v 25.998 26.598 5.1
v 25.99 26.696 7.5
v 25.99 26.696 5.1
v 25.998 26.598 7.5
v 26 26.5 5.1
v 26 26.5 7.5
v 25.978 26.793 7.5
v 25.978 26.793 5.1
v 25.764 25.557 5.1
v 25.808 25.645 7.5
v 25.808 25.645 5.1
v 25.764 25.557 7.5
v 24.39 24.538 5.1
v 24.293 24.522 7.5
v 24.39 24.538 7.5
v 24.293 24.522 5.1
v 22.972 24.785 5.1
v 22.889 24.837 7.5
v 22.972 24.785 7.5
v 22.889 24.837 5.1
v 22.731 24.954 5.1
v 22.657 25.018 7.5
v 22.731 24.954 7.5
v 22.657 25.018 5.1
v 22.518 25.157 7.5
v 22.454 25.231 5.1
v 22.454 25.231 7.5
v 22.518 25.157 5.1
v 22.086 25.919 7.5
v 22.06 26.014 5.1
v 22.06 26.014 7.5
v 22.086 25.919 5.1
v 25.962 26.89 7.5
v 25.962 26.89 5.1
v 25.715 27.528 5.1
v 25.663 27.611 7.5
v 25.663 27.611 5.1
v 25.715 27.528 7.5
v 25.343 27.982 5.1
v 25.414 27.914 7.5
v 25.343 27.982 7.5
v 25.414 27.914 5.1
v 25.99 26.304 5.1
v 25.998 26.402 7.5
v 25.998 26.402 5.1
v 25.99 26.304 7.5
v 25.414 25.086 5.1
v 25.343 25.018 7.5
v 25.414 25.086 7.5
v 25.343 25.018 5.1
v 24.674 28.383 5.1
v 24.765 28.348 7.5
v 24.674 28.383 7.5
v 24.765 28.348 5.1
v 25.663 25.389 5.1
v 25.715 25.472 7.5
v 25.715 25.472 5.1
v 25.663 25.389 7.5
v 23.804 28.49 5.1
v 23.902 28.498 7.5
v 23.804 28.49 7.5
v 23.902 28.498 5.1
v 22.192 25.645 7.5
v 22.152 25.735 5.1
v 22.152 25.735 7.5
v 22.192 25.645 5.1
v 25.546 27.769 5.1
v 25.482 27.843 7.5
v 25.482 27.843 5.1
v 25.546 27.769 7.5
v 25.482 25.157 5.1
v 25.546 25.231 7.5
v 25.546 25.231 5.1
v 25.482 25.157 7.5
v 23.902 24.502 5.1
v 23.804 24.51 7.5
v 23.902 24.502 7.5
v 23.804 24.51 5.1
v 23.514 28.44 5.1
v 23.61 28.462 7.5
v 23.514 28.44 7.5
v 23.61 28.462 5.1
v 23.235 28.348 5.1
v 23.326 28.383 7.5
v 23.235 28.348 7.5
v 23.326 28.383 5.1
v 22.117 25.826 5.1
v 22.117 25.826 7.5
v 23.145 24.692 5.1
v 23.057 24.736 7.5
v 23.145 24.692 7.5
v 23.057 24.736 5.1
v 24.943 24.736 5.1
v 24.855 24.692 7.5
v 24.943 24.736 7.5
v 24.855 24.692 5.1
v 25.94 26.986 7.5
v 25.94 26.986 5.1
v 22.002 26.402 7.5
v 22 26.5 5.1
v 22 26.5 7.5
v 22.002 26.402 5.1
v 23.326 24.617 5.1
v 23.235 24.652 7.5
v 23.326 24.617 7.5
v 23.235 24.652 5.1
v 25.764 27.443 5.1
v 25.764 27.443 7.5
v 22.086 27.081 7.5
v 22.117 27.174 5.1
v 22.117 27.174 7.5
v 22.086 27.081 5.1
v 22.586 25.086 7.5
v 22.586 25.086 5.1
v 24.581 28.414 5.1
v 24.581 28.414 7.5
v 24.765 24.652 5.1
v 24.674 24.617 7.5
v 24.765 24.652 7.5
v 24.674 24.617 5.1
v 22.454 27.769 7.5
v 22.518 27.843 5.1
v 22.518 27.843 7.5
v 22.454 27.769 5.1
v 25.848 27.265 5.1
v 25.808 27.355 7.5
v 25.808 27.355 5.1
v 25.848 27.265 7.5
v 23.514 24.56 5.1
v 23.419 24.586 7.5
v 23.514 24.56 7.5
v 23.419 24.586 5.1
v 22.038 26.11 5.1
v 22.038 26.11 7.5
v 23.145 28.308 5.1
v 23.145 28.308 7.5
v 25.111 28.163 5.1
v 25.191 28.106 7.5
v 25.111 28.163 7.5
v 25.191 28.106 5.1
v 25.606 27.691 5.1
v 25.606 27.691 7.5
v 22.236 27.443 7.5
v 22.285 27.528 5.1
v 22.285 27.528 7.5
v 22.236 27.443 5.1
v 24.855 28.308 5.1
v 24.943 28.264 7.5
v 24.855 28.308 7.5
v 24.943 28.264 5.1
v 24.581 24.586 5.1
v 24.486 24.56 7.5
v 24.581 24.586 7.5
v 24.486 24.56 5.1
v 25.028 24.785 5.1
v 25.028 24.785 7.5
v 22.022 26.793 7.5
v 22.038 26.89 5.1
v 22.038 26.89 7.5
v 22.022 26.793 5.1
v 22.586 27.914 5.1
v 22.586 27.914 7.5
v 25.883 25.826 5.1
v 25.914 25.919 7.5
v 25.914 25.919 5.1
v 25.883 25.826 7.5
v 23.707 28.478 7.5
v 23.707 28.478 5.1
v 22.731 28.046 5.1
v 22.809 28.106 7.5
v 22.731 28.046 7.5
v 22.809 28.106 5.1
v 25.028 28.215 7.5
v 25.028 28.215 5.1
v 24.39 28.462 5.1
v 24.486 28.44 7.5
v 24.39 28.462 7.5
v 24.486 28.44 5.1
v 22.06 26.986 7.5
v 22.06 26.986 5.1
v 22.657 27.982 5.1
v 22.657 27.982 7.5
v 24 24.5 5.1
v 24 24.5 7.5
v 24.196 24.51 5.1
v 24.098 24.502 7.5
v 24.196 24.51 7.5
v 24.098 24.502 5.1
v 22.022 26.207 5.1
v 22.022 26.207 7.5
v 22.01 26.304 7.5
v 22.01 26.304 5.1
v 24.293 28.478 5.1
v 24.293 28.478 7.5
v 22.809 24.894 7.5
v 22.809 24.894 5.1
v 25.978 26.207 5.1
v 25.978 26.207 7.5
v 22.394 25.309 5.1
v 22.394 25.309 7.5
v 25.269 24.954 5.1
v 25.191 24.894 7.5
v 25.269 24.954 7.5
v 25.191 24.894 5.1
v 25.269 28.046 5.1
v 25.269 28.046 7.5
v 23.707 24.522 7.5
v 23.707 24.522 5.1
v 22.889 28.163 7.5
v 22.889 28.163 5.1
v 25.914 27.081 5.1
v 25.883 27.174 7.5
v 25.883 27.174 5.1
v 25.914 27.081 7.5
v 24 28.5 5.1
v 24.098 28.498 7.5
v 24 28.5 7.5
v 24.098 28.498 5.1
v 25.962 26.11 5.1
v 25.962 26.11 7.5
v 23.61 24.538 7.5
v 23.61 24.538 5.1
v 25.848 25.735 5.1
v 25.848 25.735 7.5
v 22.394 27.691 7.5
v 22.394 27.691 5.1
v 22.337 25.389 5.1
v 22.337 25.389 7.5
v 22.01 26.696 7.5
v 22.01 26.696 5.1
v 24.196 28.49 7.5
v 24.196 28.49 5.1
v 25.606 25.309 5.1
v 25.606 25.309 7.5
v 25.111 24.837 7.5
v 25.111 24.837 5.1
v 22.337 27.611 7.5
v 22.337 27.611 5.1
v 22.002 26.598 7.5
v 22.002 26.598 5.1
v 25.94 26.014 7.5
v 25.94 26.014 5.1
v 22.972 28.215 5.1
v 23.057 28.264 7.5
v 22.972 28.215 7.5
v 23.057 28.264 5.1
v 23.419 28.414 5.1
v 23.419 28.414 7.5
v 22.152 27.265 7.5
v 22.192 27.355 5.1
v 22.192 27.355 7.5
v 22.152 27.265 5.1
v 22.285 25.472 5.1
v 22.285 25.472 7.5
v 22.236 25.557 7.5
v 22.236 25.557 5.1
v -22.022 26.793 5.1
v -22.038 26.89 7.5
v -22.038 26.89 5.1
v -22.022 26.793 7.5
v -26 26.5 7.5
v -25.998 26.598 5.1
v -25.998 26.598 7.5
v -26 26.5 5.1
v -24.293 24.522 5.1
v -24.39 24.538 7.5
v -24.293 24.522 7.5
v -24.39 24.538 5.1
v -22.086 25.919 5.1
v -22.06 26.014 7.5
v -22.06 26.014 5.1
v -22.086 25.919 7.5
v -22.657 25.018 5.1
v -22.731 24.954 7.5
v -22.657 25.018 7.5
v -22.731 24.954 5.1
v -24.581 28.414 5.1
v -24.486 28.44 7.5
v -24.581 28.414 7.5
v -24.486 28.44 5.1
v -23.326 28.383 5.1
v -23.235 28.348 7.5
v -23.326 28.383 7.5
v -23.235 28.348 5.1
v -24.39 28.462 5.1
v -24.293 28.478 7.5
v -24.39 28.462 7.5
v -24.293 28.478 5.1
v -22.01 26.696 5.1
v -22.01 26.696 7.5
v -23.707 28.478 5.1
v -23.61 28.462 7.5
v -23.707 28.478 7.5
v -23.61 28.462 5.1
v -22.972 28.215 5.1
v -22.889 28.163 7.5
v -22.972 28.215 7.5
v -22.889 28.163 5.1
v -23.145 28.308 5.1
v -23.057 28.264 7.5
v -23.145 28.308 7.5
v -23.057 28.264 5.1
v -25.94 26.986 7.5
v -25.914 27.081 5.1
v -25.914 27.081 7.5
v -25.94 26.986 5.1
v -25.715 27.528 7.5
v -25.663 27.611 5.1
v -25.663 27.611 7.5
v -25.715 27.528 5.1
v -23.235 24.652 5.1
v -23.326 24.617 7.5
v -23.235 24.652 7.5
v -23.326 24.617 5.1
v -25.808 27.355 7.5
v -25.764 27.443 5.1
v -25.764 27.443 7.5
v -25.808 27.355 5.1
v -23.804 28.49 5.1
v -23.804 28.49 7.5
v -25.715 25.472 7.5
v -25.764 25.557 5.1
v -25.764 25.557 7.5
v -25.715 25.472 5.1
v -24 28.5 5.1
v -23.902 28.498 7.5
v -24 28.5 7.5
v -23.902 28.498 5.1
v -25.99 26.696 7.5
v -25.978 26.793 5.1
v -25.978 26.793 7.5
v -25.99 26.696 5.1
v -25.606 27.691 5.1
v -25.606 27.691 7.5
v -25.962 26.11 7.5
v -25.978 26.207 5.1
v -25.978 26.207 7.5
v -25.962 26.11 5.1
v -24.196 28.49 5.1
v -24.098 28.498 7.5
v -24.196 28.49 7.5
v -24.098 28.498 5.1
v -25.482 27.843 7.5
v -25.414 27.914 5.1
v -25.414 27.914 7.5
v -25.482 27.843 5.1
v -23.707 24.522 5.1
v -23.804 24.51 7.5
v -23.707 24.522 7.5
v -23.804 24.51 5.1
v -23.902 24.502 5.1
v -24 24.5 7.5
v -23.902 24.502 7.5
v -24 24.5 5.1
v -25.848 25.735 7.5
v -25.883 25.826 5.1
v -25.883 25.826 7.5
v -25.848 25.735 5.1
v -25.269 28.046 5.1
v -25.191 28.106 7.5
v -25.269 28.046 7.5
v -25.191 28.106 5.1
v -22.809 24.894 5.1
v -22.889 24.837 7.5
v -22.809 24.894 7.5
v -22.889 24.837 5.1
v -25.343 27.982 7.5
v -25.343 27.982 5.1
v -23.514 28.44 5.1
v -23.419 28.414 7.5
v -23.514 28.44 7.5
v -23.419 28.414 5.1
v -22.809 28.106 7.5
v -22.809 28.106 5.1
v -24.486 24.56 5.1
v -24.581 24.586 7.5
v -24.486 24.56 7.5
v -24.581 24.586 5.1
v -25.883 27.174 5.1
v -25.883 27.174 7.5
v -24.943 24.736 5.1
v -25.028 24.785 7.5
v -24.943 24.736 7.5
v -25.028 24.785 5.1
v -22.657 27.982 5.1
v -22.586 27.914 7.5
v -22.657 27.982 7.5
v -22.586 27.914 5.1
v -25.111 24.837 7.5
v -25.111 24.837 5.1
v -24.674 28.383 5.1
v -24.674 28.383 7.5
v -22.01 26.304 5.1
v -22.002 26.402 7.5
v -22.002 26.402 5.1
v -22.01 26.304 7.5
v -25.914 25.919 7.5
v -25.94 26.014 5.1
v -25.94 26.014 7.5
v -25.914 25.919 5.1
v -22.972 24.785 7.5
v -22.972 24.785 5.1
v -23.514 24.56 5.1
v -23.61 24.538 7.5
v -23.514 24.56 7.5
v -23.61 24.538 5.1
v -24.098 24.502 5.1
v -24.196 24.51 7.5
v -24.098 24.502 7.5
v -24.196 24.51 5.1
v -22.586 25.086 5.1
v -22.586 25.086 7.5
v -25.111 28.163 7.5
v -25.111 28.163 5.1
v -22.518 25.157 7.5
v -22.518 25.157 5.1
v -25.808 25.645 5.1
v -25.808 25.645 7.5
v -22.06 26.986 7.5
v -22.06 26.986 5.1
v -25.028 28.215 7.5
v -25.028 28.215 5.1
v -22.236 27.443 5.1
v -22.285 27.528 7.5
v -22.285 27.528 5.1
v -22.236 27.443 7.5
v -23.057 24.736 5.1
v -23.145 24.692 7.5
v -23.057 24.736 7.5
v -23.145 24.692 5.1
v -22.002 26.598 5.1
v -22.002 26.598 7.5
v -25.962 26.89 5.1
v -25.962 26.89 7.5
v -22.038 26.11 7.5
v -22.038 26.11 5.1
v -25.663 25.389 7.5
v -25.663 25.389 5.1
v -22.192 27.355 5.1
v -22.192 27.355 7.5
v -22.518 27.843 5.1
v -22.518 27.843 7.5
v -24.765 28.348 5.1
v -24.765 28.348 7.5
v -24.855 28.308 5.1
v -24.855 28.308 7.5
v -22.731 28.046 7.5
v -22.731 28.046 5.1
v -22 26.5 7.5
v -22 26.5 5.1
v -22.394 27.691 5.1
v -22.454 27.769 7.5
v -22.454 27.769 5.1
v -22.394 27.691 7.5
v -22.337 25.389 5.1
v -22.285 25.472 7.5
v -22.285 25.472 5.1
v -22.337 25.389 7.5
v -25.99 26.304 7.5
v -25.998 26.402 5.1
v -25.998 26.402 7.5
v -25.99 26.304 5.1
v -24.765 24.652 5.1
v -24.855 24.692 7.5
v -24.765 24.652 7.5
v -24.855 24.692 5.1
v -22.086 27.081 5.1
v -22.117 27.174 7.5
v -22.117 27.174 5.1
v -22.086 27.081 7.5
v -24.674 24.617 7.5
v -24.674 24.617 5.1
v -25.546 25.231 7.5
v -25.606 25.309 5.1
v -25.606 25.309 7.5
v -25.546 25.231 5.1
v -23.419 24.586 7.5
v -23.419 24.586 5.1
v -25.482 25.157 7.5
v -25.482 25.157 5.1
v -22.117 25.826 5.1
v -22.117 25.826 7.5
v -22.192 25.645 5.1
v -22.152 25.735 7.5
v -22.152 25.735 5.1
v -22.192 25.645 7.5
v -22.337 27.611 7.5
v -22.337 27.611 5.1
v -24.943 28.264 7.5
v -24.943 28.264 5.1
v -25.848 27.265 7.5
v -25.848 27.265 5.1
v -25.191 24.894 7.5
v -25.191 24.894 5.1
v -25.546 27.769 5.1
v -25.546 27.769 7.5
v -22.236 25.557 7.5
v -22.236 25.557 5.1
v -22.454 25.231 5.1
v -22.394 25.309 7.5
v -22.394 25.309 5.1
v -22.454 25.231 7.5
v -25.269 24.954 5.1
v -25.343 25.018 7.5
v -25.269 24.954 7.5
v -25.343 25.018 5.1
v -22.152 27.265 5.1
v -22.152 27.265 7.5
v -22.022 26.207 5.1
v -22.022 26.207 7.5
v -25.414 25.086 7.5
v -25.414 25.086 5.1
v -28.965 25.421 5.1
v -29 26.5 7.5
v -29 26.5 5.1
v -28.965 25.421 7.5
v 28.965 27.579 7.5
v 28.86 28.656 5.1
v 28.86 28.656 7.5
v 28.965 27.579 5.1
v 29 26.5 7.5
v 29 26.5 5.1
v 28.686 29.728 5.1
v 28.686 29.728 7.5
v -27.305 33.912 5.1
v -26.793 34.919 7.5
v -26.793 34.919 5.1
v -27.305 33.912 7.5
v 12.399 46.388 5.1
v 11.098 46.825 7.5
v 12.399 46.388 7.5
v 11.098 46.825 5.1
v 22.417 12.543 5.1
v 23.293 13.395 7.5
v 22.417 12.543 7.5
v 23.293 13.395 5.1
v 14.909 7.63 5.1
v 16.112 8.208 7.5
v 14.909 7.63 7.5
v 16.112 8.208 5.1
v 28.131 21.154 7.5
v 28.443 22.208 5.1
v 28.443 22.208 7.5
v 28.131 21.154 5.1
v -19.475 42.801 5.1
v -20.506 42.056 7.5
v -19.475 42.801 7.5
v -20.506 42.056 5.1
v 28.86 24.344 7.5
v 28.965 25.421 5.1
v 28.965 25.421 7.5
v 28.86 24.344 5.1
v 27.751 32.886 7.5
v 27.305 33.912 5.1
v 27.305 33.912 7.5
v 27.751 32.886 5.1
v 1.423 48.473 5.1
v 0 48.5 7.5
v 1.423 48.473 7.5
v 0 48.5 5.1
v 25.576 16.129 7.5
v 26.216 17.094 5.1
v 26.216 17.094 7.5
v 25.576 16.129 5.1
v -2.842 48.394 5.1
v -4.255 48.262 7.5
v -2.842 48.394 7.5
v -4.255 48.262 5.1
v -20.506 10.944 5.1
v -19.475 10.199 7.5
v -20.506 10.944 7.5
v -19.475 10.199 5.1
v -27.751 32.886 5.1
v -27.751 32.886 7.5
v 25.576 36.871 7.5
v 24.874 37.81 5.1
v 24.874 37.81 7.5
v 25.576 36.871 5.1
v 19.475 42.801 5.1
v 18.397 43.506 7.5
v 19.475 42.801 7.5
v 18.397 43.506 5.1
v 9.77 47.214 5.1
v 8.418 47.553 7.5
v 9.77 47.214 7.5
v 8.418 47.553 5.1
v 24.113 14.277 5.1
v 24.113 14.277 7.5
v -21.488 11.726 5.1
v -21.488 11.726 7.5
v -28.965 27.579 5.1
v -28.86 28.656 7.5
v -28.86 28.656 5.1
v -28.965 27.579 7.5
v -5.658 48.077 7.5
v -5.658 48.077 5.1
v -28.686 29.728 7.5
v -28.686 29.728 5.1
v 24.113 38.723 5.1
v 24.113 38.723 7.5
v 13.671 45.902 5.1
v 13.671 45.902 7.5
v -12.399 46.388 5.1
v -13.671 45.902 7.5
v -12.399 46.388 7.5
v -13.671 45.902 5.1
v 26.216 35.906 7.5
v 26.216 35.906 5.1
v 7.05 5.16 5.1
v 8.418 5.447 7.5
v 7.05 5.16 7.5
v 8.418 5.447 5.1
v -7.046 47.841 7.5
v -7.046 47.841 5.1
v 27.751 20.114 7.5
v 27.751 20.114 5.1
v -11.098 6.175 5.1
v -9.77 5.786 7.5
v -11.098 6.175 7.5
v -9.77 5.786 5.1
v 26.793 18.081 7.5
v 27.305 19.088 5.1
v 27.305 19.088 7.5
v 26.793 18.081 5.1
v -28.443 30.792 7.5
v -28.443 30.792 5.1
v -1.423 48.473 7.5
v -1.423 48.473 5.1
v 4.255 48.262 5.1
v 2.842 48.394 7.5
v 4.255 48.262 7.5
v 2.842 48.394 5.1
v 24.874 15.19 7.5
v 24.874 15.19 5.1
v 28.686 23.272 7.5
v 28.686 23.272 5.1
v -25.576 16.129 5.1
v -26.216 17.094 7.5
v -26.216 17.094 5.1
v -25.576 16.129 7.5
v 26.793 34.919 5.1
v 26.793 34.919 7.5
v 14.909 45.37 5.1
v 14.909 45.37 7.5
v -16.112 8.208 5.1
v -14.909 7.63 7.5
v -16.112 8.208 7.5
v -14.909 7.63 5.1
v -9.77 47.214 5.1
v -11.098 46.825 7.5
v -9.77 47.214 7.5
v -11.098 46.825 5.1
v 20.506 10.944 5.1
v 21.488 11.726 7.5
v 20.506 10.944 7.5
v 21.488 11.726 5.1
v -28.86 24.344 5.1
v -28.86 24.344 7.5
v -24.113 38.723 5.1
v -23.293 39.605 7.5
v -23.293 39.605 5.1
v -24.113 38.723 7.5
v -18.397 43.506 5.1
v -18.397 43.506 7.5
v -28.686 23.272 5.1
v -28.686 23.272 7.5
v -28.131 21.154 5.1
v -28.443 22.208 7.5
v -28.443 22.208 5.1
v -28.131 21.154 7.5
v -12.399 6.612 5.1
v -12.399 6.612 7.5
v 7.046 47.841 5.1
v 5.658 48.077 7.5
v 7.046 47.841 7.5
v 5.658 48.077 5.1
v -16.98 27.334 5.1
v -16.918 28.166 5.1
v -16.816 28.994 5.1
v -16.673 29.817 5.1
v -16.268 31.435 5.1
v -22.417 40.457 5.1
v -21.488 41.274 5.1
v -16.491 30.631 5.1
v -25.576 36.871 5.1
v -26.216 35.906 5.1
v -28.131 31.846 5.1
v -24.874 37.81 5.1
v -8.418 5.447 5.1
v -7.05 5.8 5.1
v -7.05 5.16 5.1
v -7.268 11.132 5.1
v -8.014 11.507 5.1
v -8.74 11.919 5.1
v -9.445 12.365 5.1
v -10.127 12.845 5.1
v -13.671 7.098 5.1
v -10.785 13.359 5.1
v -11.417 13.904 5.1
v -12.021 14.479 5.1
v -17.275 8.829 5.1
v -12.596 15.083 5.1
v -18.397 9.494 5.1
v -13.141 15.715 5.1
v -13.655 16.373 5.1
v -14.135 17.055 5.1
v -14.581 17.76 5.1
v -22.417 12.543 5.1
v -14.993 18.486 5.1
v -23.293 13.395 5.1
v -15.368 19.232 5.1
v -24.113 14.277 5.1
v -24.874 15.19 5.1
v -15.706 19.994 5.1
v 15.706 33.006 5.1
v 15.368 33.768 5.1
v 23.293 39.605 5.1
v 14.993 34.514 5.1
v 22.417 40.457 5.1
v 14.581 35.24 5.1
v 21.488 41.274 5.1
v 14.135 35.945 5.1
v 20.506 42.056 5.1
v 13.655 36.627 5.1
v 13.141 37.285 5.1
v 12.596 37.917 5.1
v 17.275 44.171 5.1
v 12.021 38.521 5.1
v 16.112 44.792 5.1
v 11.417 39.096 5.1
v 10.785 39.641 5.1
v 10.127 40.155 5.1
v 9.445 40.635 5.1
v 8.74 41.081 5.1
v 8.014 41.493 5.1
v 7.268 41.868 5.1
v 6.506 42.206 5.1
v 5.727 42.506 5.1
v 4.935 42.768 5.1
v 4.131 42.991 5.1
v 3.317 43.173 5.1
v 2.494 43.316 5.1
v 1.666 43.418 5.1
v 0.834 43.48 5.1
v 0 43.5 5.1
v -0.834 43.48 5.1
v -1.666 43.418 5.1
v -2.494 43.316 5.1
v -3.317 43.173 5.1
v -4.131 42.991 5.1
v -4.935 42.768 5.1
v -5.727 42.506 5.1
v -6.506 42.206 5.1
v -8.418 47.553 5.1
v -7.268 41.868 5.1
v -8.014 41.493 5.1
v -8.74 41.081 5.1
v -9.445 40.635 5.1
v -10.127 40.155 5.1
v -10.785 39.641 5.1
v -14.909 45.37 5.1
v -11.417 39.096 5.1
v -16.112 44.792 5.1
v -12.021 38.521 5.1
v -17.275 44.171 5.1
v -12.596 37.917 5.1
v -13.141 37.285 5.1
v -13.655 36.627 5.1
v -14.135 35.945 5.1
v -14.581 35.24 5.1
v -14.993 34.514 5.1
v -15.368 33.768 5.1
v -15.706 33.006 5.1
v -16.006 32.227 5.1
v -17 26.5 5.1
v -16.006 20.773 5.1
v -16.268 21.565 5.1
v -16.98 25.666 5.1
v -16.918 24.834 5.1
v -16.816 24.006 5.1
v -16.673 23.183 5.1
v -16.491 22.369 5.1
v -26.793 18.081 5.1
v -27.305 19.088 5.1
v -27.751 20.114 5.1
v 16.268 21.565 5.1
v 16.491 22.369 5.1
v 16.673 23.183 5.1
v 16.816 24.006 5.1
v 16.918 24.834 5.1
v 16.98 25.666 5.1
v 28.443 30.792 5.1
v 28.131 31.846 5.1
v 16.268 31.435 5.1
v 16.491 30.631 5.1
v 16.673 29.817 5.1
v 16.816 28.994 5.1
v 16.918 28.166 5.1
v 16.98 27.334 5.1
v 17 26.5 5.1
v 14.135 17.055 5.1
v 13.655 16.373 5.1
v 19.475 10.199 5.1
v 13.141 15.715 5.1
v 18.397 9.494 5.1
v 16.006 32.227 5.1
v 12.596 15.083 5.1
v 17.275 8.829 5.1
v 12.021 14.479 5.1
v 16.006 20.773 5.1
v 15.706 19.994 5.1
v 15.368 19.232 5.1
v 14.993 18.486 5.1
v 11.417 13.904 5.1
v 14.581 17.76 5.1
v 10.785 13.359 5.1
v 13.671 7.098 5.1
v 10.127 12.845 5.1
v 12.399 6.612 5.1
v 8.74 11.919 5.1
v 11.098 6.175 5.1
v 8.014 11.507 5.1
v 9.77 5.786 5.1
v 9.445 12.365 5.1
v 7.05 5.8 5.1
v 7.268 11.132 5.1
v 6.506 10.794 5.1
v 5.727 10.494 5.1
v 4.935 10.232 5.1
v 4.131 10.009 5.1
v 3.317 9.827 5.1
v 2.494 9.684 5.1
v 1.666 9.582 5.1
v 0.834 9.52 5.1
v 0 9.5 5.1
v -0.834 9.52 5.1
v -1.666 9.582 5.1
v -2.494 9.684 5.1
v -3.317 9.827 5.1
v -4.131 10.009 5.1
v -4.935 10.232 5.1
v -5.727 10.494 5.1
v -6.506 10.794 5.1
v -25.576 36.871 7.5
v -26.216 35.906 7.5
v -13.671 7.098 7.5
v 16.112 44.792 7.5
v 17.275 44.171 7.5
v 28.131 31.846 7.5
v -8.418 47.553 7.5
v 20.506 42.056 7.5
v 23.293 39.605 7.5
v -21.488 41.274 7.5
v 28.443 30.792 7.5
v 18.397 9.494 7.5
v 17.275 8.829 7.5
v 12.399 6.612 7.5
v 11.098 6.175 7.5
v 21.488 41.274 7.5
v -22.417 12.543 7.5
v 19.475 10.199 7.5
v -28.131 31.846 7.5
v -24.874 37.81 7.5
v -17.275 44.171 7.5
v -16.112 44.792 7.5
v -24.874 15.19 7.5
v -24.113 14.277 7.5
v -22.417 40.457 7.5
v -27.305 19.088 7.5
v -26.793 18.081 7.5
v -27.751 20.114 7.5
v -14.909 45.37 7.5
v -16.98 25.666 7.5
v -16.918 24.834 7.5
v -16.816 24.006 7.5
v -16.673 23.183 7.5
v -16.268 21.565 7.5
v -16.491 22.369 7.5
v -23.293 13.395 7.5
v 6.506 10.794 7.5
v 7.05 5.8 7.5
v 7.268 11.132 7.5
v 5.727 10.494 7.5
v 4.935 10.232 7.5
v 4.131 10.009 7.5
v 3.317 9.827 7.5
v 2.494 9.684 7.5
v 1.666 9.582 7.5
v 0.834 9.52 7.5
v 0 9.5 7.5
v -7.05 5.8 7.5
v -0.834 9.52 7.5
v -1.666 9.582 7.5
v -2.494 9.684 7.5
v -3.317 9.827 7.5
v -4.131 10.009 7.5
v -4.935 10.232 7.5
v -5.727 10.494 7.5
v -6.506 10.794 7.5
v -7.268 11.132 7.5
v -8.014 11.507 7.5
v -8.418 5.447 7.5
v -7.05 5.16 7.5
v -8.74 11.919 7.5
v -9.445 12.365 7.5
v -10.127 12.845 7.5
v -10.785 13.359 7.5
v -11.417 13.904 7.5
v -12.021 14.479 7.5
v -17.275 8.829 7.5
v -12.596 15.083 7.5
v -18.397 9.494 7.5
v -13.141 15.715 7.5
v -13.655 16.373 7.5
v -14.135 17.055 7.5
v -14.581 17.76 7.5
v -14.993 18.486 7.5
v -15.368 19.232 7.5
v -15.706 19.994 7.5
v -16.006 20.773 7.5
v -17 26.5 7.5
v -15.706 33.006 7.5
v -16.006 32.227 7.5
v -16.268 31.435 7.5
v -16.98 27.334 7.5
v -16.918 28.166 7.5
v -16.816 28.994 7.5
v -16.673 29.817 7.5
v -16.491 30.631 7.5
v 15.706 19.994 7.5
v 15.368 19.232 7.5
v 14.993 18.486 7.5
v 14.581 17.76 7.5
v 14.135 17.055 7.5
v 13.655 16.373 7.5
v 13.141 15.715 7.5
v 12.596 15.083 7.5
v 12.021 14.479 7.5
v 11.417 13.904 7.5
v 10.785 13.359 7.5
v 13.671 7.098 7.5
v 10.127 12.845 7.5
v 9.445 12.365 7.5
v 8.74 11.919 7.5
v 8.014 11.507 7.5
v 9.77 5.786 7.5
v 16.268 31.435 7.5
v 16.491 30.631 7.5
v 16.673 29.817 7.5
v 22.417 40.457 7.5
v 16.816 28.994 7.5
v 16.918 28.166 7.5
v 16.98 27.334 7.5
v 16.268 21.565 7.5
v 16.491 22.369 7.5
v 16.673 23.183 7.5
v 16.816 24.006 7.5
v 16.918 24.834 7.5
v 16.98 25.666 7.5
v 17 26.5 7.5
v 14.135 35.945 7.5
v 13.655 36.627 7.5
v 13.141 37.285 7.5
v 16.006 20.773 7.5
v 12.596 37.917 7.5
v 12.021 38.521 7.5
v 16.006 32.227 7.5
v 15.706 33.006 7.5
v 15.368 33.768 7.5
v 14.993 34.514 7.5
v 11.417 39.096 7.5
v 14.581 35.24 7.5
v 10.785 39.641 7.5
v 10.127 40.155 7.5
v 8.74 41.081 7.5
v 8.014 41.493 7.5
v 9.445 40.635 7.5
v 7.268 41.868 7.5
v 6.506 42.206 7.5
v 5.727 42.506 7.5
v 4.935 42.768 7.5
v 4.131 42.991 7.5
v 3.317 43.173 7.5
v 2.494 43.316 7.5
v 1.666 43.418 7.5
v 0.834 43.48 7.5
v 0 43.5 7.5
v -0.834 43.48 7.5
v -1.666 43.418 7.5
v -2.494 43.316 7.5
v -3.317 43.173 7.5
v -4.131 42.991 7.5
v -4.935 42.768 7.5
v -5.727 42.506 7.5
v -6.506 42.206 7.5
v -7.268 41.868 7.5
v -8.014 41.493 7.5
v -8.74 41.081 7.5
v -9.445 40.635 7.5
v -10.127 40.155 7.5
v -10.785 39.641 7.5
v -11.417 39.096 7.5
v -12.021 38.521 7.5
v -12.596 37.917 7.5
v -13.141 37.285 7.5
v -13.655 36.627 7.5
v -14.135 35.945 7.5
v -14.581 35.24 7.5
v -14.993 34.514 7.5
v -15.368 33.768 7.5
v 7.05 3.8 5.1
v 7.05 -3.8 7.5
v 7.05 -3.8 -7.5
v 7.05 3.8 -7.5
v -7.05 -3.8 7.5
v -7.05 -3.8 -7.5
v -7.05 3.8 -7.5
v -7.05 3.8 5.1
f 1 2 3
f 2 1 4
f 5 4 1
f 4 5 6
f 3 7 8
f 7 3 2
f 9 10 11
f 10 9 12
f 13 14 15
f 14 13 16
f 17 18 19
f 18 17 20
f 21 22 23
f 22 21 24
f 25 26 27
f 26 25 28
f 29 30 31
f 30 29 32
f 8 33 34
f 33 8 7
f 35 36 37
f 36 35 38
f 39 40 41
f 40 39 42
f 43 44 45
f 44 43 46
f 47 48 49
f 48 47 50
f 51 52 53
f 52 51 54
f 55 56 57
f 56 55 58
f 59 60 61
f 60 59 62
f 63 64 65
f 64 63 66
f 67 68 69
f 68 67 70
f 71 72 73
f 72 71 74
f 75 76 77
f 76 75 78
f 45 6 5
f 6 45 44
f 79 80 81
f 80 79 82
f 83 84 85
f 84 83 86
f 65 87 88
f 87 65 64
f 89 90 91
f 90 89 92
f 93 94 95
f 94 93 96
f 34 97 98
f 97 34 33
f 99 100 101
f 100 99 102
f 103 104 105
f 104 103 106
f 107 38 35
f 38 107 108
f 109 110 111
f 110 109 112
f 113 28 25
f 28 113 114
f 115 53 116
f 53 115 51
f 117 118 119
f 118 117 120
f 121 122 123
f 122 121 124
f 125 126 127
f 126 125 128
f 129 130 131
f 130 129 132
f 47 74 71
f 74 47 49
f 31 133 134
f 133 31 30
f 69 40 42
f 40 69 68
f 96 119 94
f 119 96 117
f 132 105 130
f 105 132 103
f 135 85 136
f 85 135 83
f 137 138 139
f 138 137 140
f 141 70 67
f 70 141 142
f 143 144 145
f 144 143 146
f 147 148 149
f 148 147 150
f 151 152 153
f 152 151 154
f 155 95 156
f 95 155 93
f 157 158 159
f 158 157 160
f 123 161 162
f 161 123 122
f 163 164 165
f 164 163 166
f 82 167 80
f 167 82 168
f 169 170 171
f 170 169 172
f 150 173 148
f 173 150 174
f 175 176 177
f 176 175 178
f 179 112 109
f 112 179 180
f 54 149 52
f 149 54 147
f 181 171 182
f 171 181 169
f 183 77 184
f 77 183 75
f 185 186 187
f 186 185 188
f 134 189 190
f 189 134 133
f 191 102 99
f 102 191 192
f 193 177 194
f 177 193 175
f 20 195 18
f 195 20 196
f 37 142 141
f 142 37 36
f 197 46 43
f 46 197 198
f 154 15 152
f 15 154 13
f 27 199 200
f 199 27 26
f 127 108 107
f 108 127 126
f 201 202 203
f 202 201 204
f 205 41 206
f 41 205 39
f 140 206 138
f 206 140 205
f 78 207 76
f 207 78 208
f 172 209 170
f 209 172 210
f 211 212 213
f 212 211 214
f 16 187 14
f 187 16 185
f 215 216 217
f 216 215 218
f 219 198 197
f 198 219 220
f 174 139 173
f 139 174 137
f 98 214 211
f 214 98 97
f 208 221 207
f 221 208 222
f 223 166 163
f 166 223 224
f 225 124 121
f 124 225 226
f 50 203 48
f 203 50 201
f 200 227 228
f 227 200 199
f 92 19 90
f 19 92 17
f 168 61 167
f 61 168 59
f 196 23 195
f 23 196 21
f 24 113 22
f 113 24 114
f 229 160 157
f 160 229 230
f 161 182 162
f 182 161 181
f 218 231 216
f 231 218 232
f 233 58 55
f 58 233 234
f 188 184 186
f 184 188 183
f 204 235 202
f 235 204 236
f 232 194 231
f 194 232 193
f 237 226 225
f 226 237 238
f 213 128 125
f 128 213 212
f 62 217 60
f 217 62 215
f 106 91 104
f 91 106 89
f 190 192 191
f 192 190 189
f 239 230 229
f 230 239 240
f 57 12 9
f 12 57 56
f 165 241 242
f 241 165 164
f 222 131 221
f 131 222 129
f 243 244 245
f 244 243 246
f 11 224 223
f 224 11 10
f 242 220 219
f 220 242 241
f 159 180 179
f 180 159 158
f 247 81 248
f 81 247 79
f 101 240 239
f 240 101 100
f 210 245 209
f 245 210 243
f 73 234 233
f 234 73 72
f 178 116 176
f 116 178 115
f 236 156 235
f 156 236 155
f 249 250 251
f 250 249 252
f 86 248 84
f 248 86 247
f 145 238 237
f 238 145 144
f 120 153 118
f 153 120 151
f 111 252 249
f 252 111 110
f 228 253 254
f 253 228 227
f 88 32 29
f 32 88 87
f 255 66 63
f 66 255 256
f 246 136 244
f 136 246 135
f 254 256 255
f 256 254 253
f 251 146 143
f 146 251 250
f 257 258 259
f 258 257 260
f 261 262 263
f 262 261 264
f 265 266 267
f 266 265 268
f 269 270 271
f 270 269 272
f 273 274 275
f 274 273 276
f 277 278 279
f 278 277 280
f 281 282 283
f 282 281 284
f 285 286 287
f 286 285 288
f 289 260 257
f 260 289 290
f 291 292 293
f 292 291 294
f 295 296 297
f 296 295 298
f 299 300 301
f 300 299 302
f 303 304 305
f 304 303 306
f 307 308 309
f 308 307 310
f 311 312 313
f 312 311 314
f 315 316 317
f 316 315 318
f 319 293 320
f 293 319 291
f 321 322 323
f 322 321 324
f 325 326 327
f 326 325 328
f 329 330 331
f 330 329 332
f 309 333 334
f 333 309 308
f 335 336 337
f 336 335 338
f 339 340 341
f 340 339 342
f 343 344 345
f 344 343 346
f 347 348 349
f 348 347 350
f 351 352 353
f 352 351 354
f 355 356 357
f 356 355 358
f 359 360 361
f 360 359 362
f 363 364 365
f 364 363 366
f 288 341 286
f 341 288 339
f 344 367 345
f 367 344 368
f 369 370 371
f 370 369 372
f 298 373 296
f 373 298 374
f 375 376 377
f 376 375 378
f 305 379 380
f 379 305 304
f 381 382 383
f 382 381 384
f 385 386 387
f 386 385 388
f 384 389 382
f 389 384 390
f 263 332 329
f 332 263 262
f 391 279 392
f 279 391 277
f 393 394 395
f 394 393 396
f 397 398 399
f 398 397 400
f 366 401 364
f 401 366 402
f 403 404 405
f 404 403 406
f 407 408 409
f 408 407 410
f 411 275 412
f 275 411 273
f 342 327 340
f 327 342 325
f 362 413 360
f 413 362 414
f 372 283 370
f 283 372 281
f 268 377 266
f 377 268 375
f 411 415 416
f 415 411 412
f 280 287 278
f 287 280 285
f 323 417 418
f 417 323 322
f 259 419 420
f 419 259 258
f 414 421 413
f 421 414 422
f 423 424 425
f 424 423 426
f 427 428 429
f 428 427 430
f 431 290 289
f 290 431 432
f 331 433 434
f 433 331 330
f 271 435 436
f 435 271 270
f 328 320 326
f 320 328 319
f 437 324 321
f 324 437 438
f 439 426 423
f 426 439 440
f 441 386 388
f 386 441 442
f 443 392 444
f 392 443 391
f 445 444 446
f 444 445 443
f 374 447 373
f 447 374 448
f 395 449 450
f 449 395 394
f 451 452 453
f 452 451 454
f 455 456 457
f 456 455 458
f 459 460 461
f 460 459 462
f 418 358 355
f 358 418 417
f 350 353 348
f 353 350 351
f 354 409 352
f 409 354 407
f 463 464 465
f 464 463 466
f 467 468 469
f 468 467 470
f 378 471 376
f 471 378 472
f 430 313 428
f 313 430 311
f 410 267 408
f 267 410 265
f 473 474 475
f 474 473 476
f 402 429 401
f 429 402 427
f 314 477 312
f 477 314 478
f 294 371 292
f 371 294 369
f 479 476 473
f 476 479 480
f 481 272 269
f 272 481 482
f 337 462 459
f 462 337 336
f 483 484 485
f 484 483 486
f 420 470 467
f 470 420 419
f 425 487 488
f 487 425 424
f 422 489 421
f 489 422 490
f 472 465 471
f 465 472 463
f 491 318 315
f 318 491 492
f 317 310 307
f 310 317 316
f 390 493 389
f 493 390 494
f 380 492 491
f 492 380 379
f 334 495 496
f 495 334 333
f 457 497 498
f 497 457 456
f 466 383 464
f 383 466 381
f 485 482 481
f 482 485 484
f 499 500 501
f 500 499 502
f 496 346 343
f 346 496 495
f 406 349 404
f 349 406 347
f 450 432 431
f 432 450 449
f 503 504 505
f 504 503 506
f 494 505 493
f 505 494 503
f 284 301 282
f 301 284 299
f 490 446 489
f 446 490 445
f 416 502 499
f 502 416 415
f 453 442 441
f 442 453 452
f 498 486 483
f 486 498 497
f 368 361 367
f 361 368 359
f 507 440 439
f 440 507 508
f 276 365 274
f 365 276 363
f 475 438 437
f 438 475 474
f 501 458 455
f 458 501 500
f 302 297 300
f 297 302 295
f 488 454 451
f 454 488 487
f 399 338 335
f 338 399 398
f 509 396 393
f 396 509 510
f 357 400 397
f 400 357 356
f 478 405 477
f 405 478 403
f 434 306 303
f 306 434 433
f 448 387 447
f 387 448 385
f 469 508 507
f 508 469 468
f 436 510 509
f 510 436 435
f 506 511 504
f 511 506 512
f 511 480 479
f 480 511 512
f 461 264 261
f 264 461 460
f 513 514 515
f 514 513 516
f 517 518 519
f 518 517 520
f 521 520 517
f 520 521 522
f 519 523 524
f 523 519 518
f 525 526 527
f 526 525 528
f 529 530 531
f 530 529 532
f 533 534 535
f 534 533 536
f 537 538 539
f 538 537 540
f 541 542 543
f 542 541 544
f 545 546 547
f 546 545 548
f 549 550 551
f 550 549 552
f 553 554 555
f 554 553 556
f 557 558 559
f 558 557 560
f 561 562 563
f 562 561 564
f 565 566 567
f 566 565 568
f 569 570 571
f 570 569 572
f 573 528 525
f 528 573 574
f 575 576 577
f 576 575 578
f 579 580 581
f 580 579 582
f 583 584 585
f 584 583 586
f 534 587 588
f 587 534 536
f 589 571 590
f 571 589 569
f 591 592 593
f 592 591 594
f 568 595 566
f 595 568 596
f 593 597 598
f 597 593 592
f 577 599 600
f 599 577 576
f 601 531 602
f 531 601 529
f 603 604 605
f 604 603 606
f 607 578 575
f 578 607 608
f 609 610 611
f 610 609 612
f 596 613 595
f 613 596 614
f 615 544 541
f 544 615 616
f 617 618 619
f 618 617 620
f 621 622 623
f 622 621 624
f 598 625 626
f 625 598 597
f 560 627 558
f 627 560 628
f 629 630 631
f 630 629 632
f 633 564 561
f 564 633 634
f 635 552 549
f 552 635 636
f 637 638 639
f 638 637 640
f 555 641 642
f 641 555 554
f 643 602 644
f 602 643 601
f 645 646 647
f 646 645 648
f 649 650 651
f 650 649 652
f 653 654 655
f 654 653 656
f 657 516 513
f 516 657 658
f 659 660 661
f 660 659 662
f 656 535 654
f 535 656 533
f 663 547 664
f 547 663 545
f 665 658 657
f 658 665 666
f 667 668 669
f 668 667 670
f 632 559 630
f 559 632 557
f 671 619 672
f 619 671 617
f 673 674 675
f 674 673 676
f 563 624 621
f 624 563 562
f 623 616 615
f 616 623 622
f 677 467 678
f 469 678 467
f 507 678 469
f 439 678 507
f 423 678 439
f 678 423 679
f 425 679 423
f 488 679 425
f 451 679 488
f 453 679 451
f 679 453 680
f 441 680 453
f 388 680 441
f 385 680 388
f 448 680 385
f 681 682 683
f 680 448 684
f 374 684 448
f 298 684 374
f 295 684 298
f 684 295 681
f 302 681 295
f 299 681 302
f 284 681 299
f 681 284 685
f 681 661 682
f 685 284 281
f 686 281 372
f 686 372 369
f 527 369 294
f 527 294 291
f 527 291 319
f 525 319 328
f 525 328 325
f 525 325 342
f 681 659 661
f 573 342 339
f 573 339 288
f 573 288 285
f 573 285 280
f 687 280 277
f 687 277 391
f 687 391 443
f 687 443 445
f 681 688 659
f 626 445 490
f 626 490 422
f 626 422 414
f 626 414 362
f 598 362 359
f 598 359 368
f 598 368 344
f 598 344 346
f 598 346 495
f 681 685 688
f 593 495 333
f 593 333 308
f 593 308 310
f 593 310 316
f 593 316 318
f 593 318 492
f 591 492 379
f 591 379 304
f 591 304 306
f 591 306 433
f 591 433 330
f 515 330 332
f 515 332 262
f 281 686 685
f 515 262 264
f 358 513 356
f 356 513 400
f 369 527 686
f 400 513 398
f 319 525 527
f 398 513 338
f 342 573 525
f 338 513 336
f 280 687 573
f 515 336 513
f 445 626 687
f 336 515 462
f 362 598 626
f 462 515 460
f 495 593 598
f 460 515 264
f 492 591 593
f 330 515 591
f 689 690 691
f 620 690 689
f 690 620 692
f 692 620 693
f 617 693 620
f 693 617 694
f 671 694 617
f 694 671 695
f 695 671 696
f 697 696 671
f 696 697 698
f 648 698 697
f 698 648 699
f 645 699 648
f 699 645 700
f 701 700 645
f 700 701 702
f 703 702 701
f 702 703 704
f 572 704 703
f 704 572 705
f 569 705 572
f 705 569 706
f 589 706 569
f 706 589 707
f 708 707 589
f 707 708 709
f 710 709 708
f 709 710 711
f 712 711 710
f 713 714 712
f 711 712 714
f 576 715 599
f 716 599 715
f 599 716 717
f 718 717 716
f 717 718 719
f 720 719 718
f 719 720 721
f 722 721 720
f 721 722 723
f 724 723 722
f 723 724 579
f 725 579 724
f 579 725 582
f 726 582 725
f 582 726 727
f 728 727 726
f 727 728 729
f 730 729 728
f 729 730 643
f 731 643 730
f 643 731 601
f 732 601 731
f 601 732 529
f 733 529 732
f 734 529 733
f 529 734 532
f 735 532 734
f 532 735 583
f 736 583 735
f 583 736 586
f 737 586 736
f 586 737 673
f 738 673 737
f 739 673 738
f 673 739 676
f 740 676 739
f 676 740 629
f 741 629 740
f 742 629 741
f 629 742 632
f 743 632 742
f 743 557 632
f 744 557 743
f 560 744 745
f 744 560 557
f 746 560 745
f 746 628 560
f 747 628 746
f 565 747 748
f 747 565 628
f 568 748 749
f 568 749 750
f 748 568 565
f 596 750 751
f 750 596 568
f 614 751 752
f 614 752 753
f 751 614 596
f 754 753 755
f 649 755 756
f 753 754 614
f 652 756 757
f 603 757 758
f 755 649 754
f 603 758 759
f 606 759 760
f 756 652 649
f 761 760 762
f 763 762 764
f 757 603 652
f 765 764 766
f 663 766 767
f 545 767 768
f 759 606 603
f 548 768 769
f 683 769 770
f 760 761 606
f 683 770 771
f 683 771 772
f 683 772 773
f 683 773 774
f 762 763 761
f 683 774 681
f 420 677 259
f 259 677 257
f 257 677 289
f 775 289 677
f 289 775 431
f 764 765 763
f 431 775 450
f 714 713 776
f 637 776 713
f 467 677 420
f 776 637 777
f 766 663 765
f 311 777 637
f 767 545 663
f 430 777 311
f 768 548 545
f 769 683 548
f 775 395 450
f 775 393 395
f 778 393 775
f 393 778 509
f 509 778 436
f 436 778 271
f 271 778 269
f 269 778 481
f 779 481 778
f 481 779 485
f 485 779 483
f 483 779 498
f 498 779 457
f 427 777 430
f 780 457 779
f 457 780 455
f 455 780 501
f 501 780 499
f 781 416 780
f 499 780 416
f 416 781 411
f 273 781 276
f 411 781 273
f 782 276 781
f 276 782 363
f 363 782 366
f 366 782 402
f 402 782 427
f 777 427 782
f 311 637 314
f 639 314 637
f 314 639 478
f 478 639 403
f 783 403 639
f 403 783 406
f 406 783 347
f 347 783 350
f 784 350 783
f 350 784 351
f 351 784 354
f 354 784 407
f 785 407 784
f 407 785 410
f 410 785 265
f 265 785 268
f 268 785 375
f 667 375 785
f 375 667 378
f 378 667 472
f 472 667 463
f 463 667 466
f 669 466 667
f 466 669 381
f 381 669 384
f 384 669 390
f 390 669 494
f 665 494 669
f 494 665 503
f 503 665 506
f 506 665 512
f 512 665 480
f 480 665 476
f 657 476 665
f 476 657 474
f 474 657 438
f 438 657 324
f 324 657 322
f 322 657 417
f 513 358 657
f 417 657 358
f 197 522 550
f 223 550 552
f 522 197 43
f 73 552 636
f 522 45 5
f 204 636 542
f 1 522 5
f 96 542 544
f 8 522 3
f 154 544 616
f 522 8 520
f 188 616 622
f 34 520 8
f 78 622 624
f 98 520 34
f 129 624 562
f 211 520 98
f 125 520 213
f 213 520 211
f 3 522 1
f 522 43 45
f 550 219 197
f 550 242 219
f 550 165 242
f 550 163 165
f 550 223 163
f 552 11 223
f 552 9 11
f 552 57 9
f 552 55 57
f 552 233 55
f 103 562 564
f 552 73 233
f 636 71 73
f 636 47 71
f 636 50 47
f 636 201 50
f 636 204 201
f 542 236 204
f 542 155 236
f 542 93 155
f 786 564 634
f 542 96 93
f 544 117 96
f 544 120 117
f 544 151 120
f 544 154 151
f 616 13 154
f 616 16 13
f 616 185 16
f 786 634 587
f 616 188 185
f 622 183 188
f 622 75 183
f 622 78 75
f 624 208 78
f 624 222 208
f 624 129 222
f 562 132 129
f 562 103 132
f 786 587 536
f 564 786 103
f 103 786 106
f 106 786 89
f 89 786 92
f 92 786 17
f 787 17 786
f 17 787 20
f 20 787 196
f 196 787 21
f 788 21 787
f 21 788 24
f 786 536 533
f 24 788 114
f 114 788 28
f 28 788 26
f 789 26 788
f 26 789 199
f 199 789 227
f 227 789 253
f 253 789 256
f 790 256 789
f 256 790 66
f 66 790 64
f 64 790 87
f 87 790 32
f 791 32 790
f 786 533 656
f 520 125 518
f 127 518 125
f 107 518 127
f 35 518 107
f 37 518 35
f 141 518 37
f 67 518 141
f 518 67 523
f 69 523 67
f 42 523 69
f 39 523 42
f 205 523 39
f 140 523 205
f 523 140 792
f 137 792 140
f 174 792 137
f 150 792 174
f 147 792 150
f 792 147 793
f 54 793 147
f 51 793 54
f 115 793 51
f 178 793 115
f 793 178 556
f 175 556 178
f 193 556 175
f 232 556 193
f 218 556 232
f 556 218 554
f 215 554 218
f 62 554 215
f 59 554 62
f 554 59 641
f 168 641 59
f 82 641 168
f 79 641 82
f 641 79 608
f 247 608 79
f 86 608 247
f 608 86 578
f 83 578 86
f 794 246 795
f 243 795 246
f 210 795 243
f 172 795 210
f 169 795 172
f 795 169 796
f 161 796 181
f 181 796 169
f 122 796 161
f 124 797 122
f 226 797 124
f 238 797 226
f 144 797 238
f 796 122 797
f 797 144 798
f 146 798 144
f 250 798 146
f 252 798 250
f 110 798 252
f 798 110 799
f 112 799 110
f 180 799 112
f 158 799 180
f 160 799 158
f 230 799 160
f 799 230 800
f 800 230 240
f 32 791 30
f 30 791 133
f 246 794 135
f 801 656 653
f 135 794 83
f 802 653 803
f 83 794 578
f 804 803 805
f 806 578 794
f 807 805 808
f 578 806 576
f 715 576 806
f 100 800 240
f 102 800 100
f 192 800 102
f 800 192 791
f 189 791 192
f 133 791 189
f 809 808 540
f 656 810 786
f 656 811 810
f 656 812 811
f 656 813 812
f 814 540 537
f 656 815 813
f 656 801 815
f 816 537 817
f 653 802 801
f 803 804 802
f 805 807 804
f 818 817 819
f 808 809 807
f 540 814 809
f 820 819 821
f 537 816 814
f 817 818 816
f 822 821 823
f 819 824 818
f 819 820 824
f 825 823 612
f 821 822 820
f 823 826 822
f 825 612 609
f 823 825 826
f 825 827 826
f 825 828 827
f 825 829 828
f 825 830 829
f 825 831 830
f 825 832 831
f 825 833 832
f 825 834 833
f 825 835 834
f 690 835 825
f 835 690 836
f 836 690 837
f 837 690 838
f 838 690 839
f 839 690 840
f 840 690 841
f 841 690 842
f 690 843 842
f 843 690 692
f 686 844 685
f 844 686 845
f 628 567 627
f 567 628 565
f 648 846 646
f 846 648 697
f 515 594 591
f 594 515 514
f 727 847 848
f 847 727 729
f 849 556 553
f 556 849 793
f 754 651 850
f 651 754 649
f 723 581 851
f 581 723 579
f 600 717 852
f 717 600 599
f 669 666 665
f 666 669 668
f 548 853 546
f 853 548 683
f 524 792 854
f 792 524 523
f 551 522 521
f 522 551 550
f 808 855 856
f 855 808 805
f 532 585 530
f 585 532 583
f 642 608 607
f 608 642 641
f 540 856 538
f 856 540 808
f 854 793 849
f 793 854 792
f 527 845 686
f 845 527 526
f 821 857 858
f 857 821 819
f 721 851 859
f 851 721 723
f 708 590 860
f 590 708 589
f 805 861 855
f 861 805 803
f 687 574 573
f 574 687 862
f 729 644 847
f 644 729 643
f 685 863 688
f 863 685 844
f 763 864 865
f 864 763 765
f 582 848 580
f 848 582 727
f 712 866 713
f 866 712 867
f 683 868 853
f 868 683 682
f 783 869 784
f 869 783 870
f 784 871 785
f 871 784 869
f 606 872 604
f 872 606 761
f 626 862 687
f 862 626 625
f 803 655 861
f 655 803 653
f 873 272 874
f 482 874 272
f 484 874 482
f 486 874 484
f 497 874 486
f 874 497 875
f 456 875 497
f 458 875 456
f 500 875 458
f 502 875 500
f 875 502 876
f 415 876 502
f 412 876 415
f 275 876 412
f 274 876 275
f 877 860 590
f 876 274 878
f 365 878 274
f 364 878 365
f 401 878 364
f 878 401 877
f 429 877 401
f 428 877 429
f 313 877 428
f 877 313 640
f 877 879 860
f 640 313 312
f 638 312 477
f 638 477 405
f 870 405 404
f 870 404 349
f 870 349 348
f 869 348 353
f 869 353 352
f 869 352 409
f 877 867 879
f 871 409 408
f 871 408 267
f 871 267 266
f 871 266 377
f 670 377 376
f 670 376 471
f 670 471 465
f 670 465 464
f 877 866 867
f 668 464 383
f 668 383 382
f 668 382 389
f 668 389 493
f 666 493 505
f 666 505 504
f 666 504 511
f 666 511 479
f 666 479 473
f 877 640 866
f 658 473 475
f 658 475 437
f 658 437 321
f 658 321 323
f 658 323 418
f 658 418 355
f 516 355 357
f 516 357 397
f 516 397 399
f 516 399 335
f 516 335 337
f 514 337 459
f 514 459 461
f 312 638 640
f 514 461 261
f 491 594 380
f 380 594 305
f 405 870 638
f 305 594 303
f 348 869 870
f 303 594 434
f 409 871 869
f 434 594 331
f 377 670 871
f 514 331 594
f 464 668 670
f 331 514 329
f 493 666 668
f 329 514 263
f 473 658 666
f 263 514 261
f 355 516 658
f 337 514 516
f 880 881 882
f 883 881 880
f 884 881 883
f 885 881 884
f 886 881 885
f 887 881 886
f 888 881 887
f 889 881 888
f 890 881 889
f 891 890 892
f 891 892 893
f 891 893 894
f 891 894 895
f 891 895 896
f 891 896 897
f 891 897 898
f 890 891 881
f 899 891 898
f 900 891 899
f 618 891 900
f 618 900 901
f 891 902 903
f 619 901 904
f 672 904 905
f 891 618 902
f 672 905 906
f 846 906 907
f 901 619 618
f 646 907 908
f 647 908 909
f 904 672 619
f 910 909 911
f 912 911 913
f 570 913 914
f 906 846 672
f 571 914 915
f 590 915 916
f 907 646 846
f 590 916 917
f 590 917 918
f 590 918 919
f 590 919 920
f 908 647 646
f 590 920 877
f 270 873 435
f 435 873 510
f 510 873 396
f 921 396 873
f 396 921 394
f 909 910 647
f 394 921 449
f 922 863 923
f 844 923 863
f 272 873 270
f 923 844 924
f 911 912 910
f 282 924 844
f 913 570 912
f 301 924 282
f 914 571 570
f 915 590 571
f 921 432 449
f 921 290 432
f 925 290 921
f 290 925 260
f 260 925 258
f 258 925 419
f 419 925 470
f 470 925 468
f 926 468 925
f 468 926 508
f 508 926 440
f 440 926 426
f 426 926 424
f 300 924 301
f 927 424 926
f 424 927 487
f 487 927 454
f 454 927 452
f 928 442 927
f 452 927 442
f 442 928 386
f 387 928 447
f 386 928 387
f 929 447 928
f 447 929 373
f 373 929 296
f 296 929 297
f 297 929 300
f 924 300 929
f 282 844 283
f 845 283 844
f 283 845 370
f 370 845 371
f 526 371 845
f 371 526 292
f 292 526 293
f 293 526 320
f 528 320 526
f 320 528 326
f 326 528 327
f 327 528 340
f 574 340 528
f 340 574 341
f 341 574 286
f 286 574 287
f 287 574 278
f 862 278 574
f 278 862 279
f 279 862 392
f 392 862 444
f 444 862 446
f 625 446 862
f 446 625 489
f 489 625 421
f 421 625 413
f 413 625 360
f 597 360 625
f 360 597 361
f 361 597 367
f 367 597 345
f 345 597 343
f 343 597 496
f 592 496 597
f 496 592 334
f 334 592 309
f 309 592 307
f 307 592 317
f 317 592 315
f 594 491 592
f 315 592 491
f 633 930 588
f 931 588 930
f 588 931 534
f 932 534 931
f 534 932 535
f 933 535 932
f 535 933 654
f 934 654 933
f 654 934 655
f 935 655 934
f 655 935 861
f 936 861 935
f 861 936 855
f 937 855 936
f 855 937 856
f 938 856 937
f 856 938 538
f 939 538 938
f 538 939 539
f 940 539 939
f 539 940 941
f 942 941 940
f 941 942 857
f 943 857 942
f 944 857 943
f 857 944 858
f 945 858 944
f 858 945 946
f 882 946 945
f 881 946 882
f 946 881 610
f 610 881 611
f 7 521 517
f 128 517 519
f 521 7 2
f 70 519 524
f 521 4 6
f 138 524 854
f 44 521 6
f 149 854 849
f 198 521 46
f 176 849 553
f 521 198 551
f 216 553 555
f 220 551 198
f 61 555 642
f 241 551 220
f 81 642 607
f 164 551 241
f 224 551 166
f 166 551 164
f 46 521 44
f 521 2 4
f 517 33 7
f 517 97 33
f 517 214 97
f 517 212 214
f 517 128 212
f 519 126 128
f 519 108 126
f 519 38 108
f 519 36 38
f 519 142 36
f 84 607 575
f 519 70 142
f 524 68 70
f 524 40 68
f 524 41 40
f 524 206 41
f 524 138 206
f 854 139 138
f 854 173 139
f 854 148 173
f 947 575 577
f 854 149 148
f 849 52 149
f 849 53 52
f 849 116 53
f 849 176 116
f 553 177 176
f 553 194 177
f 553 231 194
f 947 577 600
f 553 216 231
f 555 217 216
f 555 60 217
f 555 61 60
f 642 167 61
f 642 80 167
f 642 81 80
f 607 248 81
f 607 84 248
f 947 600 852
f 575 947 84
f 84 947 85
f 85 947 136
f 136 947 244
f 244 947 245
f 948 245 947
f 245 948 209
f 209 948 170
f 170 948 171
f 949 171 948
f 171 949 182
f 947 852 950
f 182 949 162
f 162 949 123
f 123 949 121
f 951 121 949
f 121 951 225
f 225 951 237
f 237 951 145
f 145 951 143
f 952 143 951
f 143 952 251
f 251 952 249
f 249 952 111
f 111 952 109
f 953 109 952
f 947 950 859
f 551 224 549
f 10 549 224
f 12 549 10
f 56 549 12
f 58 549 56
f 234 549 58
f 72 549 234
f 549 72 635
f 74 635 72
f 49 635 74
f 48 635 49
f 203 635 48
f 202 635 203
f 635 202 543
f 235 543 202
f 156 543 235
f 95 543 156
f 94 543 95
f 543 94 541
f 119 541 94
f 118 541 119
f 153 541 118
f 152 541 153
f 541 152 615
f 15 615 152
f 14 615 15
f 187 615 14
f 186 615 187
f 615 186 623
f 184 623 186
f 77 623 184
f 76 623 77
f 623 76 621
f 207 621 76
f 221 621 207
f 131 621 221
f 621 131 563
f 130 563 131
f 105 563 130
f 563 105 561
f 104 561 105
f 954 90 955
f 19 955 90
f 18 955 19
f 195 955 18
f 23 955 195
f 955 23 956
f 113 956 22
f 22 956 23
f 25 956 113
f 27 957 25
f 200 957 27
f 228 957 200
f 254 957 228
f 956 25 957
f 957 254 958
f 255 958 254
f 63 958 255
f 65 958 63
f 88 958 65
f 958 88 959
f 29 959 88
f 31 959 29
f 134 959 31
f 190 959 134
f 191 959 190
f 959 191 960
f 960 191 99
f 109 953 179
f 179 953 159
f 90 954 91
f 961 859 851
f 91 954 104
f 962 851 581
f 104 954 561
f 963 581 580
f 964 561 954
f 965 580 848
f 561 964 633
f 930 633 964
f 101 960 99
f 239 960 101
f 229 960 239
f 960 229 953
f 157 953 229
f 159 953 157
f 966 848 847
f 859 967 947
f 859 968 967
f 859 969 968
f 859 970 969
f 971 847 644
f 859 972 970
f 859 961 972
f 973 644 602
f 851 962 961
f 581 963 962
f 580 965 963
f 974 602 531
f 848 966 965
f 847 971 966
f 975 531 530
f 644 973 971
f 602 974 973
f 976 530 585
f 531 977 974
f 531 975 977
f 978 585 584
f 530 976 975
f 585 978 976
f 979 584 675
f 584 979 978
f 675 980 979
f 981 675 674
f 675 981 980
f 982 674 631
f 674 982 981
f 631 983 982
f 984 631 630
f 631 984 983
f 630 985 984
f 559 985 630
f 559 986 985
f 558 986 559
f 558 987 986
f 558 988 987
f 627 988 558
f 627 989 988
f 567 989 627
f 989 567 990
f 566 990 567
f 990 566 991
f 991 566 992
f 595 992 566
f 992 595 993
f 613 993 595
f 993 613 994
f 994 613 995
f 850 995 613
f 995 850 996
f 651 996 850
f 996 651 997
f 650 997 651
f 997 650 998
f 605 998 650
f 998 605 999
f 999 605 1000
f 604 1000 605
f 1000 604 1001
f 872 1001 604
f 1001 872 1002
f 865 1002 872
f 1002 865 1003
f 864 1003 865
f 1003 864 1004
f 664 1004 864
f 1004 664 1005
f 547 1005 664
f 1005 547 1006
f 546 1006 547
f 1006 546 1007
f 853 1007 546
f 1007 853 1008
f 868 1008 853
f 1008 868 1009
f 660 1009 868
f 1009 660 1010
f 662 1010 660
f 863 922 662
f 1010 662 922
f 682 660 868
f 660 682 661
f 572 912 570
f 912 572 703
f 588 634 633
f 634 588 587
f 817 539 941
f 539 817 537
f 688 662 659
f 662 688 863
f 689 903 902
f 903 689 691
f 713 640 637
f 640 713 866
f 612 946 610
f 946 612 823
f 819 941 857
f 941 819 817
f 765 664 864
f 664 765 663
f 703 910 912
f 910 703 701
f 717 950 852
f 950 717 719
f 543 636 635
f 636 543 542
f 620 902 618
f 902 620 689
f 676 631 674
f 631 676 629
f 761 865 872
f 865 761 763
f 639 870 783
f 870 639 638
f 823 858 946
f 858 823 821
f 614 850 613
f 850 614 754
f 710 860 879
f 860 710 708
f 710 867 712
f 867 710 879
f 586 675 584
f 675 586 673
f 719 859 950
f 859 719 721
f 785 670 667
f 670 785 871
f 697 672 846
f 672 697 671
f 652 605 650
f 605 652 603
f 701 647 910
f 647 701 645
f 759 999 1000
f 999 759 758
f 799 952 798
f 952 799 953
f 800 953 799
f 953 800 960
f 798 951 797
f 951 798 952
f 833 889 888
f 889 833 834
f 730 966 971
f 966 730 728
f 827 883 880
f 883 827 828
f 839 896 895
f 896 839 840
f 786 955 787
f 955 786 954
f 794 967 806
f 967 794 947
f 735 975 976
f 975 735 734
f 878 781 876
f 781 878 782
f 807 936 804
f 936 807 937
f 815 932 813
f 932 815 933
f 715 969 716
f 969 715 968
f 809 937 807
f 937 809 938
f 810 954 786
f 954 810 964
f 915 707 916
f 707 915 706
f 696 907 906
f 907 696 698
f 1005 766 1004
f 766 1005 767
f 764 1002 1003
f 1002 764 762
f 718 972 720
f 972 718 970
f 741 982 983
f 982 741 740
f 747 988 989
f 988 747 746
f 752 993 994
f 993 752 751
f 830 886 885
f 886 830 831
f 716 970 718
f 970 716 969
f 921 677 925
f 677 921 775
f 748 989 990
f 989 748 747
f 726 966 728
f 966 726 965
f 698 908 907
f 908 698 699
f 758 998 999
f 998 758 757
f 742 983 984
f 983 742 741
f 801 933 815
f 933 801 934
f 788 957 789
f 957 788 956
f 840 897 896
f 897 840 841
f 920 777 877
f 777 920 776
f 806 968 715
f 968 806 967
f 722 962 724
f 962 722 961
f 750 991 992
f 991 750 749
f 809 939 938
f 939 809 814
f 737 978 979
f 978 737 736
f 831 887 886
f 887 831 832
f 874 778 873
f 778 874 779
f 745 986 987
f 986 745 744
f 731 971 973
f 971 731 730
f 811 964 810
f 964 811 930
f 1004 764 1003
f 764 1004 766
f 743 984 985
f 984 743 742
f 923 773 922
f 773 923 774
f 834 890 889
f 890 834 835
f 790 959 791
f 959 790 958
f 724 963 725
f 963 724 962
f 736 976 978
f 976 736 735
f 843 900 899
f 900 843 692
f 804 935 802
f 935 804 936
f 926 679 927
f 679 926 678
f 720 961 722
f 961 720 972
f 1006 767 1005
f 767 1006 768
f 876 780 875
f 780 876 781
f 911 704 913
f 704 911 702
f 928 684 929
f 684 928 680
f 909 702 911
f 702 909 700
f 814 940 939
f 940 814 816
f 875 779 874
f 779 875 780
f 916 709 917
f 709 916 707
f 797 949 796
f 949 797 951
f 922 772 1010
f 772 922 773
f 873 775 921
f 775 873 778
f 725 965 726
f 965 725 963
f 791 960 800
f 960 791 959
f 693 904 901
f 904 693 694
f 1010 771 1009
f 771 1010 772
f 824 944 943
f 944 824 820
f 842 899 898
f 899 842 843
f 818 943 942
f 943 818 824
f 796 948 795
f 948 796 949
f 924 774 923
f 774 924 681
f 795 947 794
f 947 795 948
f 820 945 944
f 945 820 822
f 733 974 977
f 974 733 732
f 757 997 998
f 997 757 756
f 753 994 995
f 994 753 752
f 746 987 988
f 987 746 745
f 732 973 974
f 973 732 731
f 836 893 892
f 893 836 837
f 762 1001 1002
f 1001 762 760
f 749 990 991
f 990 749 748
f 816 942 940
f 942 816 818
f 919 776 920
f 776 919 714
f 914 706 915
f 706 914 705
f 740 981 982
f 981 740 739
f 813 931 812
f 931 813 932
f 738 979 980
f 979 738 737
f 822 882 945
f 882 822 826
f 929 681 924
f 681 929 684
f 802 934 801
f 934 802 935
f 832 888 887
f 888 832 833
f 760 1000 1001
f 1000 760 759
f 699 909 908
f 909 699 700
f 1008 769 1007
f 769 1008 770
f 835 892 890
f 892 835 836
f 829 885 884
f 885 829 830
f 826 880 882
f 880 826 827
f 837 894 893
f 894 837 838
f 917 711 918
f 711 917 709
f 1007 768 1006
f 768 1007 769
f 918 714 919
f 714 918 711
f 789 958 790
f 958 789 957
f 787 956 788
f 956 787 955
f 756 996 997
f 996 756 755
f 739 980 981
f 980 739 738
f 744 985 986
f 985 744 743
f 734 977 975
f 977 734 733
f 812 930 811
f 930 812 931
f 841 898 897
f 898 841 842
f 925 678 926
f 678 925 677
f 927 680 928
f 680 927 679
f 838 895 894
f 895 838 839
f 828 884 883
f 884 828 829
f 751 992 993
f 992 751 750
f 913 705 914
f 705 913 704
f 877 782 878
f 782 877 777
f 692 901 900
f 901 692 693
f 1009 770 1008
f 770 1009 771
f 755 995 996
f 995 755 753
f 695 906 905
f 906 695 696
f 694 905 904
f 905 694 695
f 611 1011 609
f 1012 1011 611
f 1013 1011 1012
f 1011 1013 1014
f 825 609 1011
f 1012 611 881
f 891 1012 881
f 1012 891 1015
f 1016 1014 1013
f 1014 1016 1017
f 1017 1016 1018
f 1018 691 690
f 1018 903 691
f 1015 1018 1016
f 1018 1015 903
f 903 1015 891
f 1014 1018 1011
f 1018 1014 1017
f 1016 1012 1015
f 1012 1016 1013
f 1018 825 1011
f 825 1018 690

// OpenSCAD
zFite = $preview ? 0.1 : 0; // z-fighting avoidance for preview
$fn = $preview ? 64 : 128;

// diameter of the motor
motor_diameter = 34;

// motor mount side insert
flange_width = 5;
flange_height = 2.4;
flange_screw_distance = 48.0;

flange_insert_separation = 2;

insert_height = 15;
insert_width = 14.1;
insert_depth = 7.6;

screw_diameter = 4;

peri_pump_side_mount(flange_width = flange_width, flange_height = flange_height, flange_screw_distance = flange_screw_distance, flange_insert_separation = flange_insert_separation, insert_height = insert_height, insert_width = insert_width, insert_depth = insert_depth, motor_diameter = motor_diameter, screw_diameter = screw_diameter);

module peri_pump_side_mount(flange_width, flange_height, flange_screw_distance,
  flange_insert_separation, insert_height, insert_width, insert_depth,
  motor_diameter, screw_diameter) 
{

  outer_diameter = motor_diameter + flange_width * 2;

  union() {
    cube([insert_width, insert_depth, insert_height], center=true); // main insert block

    // gap bridge
    translate([0, insert_depth / 2 + flange_insert_separation / 2, insert_height / 2 - flange_height / 2])
      cube([insert_width, flange_insert_separation, flange_height], center=true);

    // motor cut out
    translate([0, outer_diameter / 2 + flange_width / 2 + flange_insert_separation, insert_height / 2 - flange_height / 2]) {
      difference() {
        resize([flange_screw_distance + flange_width * 2, outer_diameter, flange_height])
          cylinder(d=outer_diameter, h=flange_height, center=true);

        // face screw cut outs
        cylinder(d=motor_diameter, h=flange_height + 0.1, center=true); // cut out for motor
        for (i = [0:1])
          mirror([i * 1, 0, 0]) // cut outs for face screws
            translate([flange_screw_distance / 2, 0, 0]) cylinder(d=screw_diameter, h=flange_height + 0.1, center=true);
      }
    }
  }
}
